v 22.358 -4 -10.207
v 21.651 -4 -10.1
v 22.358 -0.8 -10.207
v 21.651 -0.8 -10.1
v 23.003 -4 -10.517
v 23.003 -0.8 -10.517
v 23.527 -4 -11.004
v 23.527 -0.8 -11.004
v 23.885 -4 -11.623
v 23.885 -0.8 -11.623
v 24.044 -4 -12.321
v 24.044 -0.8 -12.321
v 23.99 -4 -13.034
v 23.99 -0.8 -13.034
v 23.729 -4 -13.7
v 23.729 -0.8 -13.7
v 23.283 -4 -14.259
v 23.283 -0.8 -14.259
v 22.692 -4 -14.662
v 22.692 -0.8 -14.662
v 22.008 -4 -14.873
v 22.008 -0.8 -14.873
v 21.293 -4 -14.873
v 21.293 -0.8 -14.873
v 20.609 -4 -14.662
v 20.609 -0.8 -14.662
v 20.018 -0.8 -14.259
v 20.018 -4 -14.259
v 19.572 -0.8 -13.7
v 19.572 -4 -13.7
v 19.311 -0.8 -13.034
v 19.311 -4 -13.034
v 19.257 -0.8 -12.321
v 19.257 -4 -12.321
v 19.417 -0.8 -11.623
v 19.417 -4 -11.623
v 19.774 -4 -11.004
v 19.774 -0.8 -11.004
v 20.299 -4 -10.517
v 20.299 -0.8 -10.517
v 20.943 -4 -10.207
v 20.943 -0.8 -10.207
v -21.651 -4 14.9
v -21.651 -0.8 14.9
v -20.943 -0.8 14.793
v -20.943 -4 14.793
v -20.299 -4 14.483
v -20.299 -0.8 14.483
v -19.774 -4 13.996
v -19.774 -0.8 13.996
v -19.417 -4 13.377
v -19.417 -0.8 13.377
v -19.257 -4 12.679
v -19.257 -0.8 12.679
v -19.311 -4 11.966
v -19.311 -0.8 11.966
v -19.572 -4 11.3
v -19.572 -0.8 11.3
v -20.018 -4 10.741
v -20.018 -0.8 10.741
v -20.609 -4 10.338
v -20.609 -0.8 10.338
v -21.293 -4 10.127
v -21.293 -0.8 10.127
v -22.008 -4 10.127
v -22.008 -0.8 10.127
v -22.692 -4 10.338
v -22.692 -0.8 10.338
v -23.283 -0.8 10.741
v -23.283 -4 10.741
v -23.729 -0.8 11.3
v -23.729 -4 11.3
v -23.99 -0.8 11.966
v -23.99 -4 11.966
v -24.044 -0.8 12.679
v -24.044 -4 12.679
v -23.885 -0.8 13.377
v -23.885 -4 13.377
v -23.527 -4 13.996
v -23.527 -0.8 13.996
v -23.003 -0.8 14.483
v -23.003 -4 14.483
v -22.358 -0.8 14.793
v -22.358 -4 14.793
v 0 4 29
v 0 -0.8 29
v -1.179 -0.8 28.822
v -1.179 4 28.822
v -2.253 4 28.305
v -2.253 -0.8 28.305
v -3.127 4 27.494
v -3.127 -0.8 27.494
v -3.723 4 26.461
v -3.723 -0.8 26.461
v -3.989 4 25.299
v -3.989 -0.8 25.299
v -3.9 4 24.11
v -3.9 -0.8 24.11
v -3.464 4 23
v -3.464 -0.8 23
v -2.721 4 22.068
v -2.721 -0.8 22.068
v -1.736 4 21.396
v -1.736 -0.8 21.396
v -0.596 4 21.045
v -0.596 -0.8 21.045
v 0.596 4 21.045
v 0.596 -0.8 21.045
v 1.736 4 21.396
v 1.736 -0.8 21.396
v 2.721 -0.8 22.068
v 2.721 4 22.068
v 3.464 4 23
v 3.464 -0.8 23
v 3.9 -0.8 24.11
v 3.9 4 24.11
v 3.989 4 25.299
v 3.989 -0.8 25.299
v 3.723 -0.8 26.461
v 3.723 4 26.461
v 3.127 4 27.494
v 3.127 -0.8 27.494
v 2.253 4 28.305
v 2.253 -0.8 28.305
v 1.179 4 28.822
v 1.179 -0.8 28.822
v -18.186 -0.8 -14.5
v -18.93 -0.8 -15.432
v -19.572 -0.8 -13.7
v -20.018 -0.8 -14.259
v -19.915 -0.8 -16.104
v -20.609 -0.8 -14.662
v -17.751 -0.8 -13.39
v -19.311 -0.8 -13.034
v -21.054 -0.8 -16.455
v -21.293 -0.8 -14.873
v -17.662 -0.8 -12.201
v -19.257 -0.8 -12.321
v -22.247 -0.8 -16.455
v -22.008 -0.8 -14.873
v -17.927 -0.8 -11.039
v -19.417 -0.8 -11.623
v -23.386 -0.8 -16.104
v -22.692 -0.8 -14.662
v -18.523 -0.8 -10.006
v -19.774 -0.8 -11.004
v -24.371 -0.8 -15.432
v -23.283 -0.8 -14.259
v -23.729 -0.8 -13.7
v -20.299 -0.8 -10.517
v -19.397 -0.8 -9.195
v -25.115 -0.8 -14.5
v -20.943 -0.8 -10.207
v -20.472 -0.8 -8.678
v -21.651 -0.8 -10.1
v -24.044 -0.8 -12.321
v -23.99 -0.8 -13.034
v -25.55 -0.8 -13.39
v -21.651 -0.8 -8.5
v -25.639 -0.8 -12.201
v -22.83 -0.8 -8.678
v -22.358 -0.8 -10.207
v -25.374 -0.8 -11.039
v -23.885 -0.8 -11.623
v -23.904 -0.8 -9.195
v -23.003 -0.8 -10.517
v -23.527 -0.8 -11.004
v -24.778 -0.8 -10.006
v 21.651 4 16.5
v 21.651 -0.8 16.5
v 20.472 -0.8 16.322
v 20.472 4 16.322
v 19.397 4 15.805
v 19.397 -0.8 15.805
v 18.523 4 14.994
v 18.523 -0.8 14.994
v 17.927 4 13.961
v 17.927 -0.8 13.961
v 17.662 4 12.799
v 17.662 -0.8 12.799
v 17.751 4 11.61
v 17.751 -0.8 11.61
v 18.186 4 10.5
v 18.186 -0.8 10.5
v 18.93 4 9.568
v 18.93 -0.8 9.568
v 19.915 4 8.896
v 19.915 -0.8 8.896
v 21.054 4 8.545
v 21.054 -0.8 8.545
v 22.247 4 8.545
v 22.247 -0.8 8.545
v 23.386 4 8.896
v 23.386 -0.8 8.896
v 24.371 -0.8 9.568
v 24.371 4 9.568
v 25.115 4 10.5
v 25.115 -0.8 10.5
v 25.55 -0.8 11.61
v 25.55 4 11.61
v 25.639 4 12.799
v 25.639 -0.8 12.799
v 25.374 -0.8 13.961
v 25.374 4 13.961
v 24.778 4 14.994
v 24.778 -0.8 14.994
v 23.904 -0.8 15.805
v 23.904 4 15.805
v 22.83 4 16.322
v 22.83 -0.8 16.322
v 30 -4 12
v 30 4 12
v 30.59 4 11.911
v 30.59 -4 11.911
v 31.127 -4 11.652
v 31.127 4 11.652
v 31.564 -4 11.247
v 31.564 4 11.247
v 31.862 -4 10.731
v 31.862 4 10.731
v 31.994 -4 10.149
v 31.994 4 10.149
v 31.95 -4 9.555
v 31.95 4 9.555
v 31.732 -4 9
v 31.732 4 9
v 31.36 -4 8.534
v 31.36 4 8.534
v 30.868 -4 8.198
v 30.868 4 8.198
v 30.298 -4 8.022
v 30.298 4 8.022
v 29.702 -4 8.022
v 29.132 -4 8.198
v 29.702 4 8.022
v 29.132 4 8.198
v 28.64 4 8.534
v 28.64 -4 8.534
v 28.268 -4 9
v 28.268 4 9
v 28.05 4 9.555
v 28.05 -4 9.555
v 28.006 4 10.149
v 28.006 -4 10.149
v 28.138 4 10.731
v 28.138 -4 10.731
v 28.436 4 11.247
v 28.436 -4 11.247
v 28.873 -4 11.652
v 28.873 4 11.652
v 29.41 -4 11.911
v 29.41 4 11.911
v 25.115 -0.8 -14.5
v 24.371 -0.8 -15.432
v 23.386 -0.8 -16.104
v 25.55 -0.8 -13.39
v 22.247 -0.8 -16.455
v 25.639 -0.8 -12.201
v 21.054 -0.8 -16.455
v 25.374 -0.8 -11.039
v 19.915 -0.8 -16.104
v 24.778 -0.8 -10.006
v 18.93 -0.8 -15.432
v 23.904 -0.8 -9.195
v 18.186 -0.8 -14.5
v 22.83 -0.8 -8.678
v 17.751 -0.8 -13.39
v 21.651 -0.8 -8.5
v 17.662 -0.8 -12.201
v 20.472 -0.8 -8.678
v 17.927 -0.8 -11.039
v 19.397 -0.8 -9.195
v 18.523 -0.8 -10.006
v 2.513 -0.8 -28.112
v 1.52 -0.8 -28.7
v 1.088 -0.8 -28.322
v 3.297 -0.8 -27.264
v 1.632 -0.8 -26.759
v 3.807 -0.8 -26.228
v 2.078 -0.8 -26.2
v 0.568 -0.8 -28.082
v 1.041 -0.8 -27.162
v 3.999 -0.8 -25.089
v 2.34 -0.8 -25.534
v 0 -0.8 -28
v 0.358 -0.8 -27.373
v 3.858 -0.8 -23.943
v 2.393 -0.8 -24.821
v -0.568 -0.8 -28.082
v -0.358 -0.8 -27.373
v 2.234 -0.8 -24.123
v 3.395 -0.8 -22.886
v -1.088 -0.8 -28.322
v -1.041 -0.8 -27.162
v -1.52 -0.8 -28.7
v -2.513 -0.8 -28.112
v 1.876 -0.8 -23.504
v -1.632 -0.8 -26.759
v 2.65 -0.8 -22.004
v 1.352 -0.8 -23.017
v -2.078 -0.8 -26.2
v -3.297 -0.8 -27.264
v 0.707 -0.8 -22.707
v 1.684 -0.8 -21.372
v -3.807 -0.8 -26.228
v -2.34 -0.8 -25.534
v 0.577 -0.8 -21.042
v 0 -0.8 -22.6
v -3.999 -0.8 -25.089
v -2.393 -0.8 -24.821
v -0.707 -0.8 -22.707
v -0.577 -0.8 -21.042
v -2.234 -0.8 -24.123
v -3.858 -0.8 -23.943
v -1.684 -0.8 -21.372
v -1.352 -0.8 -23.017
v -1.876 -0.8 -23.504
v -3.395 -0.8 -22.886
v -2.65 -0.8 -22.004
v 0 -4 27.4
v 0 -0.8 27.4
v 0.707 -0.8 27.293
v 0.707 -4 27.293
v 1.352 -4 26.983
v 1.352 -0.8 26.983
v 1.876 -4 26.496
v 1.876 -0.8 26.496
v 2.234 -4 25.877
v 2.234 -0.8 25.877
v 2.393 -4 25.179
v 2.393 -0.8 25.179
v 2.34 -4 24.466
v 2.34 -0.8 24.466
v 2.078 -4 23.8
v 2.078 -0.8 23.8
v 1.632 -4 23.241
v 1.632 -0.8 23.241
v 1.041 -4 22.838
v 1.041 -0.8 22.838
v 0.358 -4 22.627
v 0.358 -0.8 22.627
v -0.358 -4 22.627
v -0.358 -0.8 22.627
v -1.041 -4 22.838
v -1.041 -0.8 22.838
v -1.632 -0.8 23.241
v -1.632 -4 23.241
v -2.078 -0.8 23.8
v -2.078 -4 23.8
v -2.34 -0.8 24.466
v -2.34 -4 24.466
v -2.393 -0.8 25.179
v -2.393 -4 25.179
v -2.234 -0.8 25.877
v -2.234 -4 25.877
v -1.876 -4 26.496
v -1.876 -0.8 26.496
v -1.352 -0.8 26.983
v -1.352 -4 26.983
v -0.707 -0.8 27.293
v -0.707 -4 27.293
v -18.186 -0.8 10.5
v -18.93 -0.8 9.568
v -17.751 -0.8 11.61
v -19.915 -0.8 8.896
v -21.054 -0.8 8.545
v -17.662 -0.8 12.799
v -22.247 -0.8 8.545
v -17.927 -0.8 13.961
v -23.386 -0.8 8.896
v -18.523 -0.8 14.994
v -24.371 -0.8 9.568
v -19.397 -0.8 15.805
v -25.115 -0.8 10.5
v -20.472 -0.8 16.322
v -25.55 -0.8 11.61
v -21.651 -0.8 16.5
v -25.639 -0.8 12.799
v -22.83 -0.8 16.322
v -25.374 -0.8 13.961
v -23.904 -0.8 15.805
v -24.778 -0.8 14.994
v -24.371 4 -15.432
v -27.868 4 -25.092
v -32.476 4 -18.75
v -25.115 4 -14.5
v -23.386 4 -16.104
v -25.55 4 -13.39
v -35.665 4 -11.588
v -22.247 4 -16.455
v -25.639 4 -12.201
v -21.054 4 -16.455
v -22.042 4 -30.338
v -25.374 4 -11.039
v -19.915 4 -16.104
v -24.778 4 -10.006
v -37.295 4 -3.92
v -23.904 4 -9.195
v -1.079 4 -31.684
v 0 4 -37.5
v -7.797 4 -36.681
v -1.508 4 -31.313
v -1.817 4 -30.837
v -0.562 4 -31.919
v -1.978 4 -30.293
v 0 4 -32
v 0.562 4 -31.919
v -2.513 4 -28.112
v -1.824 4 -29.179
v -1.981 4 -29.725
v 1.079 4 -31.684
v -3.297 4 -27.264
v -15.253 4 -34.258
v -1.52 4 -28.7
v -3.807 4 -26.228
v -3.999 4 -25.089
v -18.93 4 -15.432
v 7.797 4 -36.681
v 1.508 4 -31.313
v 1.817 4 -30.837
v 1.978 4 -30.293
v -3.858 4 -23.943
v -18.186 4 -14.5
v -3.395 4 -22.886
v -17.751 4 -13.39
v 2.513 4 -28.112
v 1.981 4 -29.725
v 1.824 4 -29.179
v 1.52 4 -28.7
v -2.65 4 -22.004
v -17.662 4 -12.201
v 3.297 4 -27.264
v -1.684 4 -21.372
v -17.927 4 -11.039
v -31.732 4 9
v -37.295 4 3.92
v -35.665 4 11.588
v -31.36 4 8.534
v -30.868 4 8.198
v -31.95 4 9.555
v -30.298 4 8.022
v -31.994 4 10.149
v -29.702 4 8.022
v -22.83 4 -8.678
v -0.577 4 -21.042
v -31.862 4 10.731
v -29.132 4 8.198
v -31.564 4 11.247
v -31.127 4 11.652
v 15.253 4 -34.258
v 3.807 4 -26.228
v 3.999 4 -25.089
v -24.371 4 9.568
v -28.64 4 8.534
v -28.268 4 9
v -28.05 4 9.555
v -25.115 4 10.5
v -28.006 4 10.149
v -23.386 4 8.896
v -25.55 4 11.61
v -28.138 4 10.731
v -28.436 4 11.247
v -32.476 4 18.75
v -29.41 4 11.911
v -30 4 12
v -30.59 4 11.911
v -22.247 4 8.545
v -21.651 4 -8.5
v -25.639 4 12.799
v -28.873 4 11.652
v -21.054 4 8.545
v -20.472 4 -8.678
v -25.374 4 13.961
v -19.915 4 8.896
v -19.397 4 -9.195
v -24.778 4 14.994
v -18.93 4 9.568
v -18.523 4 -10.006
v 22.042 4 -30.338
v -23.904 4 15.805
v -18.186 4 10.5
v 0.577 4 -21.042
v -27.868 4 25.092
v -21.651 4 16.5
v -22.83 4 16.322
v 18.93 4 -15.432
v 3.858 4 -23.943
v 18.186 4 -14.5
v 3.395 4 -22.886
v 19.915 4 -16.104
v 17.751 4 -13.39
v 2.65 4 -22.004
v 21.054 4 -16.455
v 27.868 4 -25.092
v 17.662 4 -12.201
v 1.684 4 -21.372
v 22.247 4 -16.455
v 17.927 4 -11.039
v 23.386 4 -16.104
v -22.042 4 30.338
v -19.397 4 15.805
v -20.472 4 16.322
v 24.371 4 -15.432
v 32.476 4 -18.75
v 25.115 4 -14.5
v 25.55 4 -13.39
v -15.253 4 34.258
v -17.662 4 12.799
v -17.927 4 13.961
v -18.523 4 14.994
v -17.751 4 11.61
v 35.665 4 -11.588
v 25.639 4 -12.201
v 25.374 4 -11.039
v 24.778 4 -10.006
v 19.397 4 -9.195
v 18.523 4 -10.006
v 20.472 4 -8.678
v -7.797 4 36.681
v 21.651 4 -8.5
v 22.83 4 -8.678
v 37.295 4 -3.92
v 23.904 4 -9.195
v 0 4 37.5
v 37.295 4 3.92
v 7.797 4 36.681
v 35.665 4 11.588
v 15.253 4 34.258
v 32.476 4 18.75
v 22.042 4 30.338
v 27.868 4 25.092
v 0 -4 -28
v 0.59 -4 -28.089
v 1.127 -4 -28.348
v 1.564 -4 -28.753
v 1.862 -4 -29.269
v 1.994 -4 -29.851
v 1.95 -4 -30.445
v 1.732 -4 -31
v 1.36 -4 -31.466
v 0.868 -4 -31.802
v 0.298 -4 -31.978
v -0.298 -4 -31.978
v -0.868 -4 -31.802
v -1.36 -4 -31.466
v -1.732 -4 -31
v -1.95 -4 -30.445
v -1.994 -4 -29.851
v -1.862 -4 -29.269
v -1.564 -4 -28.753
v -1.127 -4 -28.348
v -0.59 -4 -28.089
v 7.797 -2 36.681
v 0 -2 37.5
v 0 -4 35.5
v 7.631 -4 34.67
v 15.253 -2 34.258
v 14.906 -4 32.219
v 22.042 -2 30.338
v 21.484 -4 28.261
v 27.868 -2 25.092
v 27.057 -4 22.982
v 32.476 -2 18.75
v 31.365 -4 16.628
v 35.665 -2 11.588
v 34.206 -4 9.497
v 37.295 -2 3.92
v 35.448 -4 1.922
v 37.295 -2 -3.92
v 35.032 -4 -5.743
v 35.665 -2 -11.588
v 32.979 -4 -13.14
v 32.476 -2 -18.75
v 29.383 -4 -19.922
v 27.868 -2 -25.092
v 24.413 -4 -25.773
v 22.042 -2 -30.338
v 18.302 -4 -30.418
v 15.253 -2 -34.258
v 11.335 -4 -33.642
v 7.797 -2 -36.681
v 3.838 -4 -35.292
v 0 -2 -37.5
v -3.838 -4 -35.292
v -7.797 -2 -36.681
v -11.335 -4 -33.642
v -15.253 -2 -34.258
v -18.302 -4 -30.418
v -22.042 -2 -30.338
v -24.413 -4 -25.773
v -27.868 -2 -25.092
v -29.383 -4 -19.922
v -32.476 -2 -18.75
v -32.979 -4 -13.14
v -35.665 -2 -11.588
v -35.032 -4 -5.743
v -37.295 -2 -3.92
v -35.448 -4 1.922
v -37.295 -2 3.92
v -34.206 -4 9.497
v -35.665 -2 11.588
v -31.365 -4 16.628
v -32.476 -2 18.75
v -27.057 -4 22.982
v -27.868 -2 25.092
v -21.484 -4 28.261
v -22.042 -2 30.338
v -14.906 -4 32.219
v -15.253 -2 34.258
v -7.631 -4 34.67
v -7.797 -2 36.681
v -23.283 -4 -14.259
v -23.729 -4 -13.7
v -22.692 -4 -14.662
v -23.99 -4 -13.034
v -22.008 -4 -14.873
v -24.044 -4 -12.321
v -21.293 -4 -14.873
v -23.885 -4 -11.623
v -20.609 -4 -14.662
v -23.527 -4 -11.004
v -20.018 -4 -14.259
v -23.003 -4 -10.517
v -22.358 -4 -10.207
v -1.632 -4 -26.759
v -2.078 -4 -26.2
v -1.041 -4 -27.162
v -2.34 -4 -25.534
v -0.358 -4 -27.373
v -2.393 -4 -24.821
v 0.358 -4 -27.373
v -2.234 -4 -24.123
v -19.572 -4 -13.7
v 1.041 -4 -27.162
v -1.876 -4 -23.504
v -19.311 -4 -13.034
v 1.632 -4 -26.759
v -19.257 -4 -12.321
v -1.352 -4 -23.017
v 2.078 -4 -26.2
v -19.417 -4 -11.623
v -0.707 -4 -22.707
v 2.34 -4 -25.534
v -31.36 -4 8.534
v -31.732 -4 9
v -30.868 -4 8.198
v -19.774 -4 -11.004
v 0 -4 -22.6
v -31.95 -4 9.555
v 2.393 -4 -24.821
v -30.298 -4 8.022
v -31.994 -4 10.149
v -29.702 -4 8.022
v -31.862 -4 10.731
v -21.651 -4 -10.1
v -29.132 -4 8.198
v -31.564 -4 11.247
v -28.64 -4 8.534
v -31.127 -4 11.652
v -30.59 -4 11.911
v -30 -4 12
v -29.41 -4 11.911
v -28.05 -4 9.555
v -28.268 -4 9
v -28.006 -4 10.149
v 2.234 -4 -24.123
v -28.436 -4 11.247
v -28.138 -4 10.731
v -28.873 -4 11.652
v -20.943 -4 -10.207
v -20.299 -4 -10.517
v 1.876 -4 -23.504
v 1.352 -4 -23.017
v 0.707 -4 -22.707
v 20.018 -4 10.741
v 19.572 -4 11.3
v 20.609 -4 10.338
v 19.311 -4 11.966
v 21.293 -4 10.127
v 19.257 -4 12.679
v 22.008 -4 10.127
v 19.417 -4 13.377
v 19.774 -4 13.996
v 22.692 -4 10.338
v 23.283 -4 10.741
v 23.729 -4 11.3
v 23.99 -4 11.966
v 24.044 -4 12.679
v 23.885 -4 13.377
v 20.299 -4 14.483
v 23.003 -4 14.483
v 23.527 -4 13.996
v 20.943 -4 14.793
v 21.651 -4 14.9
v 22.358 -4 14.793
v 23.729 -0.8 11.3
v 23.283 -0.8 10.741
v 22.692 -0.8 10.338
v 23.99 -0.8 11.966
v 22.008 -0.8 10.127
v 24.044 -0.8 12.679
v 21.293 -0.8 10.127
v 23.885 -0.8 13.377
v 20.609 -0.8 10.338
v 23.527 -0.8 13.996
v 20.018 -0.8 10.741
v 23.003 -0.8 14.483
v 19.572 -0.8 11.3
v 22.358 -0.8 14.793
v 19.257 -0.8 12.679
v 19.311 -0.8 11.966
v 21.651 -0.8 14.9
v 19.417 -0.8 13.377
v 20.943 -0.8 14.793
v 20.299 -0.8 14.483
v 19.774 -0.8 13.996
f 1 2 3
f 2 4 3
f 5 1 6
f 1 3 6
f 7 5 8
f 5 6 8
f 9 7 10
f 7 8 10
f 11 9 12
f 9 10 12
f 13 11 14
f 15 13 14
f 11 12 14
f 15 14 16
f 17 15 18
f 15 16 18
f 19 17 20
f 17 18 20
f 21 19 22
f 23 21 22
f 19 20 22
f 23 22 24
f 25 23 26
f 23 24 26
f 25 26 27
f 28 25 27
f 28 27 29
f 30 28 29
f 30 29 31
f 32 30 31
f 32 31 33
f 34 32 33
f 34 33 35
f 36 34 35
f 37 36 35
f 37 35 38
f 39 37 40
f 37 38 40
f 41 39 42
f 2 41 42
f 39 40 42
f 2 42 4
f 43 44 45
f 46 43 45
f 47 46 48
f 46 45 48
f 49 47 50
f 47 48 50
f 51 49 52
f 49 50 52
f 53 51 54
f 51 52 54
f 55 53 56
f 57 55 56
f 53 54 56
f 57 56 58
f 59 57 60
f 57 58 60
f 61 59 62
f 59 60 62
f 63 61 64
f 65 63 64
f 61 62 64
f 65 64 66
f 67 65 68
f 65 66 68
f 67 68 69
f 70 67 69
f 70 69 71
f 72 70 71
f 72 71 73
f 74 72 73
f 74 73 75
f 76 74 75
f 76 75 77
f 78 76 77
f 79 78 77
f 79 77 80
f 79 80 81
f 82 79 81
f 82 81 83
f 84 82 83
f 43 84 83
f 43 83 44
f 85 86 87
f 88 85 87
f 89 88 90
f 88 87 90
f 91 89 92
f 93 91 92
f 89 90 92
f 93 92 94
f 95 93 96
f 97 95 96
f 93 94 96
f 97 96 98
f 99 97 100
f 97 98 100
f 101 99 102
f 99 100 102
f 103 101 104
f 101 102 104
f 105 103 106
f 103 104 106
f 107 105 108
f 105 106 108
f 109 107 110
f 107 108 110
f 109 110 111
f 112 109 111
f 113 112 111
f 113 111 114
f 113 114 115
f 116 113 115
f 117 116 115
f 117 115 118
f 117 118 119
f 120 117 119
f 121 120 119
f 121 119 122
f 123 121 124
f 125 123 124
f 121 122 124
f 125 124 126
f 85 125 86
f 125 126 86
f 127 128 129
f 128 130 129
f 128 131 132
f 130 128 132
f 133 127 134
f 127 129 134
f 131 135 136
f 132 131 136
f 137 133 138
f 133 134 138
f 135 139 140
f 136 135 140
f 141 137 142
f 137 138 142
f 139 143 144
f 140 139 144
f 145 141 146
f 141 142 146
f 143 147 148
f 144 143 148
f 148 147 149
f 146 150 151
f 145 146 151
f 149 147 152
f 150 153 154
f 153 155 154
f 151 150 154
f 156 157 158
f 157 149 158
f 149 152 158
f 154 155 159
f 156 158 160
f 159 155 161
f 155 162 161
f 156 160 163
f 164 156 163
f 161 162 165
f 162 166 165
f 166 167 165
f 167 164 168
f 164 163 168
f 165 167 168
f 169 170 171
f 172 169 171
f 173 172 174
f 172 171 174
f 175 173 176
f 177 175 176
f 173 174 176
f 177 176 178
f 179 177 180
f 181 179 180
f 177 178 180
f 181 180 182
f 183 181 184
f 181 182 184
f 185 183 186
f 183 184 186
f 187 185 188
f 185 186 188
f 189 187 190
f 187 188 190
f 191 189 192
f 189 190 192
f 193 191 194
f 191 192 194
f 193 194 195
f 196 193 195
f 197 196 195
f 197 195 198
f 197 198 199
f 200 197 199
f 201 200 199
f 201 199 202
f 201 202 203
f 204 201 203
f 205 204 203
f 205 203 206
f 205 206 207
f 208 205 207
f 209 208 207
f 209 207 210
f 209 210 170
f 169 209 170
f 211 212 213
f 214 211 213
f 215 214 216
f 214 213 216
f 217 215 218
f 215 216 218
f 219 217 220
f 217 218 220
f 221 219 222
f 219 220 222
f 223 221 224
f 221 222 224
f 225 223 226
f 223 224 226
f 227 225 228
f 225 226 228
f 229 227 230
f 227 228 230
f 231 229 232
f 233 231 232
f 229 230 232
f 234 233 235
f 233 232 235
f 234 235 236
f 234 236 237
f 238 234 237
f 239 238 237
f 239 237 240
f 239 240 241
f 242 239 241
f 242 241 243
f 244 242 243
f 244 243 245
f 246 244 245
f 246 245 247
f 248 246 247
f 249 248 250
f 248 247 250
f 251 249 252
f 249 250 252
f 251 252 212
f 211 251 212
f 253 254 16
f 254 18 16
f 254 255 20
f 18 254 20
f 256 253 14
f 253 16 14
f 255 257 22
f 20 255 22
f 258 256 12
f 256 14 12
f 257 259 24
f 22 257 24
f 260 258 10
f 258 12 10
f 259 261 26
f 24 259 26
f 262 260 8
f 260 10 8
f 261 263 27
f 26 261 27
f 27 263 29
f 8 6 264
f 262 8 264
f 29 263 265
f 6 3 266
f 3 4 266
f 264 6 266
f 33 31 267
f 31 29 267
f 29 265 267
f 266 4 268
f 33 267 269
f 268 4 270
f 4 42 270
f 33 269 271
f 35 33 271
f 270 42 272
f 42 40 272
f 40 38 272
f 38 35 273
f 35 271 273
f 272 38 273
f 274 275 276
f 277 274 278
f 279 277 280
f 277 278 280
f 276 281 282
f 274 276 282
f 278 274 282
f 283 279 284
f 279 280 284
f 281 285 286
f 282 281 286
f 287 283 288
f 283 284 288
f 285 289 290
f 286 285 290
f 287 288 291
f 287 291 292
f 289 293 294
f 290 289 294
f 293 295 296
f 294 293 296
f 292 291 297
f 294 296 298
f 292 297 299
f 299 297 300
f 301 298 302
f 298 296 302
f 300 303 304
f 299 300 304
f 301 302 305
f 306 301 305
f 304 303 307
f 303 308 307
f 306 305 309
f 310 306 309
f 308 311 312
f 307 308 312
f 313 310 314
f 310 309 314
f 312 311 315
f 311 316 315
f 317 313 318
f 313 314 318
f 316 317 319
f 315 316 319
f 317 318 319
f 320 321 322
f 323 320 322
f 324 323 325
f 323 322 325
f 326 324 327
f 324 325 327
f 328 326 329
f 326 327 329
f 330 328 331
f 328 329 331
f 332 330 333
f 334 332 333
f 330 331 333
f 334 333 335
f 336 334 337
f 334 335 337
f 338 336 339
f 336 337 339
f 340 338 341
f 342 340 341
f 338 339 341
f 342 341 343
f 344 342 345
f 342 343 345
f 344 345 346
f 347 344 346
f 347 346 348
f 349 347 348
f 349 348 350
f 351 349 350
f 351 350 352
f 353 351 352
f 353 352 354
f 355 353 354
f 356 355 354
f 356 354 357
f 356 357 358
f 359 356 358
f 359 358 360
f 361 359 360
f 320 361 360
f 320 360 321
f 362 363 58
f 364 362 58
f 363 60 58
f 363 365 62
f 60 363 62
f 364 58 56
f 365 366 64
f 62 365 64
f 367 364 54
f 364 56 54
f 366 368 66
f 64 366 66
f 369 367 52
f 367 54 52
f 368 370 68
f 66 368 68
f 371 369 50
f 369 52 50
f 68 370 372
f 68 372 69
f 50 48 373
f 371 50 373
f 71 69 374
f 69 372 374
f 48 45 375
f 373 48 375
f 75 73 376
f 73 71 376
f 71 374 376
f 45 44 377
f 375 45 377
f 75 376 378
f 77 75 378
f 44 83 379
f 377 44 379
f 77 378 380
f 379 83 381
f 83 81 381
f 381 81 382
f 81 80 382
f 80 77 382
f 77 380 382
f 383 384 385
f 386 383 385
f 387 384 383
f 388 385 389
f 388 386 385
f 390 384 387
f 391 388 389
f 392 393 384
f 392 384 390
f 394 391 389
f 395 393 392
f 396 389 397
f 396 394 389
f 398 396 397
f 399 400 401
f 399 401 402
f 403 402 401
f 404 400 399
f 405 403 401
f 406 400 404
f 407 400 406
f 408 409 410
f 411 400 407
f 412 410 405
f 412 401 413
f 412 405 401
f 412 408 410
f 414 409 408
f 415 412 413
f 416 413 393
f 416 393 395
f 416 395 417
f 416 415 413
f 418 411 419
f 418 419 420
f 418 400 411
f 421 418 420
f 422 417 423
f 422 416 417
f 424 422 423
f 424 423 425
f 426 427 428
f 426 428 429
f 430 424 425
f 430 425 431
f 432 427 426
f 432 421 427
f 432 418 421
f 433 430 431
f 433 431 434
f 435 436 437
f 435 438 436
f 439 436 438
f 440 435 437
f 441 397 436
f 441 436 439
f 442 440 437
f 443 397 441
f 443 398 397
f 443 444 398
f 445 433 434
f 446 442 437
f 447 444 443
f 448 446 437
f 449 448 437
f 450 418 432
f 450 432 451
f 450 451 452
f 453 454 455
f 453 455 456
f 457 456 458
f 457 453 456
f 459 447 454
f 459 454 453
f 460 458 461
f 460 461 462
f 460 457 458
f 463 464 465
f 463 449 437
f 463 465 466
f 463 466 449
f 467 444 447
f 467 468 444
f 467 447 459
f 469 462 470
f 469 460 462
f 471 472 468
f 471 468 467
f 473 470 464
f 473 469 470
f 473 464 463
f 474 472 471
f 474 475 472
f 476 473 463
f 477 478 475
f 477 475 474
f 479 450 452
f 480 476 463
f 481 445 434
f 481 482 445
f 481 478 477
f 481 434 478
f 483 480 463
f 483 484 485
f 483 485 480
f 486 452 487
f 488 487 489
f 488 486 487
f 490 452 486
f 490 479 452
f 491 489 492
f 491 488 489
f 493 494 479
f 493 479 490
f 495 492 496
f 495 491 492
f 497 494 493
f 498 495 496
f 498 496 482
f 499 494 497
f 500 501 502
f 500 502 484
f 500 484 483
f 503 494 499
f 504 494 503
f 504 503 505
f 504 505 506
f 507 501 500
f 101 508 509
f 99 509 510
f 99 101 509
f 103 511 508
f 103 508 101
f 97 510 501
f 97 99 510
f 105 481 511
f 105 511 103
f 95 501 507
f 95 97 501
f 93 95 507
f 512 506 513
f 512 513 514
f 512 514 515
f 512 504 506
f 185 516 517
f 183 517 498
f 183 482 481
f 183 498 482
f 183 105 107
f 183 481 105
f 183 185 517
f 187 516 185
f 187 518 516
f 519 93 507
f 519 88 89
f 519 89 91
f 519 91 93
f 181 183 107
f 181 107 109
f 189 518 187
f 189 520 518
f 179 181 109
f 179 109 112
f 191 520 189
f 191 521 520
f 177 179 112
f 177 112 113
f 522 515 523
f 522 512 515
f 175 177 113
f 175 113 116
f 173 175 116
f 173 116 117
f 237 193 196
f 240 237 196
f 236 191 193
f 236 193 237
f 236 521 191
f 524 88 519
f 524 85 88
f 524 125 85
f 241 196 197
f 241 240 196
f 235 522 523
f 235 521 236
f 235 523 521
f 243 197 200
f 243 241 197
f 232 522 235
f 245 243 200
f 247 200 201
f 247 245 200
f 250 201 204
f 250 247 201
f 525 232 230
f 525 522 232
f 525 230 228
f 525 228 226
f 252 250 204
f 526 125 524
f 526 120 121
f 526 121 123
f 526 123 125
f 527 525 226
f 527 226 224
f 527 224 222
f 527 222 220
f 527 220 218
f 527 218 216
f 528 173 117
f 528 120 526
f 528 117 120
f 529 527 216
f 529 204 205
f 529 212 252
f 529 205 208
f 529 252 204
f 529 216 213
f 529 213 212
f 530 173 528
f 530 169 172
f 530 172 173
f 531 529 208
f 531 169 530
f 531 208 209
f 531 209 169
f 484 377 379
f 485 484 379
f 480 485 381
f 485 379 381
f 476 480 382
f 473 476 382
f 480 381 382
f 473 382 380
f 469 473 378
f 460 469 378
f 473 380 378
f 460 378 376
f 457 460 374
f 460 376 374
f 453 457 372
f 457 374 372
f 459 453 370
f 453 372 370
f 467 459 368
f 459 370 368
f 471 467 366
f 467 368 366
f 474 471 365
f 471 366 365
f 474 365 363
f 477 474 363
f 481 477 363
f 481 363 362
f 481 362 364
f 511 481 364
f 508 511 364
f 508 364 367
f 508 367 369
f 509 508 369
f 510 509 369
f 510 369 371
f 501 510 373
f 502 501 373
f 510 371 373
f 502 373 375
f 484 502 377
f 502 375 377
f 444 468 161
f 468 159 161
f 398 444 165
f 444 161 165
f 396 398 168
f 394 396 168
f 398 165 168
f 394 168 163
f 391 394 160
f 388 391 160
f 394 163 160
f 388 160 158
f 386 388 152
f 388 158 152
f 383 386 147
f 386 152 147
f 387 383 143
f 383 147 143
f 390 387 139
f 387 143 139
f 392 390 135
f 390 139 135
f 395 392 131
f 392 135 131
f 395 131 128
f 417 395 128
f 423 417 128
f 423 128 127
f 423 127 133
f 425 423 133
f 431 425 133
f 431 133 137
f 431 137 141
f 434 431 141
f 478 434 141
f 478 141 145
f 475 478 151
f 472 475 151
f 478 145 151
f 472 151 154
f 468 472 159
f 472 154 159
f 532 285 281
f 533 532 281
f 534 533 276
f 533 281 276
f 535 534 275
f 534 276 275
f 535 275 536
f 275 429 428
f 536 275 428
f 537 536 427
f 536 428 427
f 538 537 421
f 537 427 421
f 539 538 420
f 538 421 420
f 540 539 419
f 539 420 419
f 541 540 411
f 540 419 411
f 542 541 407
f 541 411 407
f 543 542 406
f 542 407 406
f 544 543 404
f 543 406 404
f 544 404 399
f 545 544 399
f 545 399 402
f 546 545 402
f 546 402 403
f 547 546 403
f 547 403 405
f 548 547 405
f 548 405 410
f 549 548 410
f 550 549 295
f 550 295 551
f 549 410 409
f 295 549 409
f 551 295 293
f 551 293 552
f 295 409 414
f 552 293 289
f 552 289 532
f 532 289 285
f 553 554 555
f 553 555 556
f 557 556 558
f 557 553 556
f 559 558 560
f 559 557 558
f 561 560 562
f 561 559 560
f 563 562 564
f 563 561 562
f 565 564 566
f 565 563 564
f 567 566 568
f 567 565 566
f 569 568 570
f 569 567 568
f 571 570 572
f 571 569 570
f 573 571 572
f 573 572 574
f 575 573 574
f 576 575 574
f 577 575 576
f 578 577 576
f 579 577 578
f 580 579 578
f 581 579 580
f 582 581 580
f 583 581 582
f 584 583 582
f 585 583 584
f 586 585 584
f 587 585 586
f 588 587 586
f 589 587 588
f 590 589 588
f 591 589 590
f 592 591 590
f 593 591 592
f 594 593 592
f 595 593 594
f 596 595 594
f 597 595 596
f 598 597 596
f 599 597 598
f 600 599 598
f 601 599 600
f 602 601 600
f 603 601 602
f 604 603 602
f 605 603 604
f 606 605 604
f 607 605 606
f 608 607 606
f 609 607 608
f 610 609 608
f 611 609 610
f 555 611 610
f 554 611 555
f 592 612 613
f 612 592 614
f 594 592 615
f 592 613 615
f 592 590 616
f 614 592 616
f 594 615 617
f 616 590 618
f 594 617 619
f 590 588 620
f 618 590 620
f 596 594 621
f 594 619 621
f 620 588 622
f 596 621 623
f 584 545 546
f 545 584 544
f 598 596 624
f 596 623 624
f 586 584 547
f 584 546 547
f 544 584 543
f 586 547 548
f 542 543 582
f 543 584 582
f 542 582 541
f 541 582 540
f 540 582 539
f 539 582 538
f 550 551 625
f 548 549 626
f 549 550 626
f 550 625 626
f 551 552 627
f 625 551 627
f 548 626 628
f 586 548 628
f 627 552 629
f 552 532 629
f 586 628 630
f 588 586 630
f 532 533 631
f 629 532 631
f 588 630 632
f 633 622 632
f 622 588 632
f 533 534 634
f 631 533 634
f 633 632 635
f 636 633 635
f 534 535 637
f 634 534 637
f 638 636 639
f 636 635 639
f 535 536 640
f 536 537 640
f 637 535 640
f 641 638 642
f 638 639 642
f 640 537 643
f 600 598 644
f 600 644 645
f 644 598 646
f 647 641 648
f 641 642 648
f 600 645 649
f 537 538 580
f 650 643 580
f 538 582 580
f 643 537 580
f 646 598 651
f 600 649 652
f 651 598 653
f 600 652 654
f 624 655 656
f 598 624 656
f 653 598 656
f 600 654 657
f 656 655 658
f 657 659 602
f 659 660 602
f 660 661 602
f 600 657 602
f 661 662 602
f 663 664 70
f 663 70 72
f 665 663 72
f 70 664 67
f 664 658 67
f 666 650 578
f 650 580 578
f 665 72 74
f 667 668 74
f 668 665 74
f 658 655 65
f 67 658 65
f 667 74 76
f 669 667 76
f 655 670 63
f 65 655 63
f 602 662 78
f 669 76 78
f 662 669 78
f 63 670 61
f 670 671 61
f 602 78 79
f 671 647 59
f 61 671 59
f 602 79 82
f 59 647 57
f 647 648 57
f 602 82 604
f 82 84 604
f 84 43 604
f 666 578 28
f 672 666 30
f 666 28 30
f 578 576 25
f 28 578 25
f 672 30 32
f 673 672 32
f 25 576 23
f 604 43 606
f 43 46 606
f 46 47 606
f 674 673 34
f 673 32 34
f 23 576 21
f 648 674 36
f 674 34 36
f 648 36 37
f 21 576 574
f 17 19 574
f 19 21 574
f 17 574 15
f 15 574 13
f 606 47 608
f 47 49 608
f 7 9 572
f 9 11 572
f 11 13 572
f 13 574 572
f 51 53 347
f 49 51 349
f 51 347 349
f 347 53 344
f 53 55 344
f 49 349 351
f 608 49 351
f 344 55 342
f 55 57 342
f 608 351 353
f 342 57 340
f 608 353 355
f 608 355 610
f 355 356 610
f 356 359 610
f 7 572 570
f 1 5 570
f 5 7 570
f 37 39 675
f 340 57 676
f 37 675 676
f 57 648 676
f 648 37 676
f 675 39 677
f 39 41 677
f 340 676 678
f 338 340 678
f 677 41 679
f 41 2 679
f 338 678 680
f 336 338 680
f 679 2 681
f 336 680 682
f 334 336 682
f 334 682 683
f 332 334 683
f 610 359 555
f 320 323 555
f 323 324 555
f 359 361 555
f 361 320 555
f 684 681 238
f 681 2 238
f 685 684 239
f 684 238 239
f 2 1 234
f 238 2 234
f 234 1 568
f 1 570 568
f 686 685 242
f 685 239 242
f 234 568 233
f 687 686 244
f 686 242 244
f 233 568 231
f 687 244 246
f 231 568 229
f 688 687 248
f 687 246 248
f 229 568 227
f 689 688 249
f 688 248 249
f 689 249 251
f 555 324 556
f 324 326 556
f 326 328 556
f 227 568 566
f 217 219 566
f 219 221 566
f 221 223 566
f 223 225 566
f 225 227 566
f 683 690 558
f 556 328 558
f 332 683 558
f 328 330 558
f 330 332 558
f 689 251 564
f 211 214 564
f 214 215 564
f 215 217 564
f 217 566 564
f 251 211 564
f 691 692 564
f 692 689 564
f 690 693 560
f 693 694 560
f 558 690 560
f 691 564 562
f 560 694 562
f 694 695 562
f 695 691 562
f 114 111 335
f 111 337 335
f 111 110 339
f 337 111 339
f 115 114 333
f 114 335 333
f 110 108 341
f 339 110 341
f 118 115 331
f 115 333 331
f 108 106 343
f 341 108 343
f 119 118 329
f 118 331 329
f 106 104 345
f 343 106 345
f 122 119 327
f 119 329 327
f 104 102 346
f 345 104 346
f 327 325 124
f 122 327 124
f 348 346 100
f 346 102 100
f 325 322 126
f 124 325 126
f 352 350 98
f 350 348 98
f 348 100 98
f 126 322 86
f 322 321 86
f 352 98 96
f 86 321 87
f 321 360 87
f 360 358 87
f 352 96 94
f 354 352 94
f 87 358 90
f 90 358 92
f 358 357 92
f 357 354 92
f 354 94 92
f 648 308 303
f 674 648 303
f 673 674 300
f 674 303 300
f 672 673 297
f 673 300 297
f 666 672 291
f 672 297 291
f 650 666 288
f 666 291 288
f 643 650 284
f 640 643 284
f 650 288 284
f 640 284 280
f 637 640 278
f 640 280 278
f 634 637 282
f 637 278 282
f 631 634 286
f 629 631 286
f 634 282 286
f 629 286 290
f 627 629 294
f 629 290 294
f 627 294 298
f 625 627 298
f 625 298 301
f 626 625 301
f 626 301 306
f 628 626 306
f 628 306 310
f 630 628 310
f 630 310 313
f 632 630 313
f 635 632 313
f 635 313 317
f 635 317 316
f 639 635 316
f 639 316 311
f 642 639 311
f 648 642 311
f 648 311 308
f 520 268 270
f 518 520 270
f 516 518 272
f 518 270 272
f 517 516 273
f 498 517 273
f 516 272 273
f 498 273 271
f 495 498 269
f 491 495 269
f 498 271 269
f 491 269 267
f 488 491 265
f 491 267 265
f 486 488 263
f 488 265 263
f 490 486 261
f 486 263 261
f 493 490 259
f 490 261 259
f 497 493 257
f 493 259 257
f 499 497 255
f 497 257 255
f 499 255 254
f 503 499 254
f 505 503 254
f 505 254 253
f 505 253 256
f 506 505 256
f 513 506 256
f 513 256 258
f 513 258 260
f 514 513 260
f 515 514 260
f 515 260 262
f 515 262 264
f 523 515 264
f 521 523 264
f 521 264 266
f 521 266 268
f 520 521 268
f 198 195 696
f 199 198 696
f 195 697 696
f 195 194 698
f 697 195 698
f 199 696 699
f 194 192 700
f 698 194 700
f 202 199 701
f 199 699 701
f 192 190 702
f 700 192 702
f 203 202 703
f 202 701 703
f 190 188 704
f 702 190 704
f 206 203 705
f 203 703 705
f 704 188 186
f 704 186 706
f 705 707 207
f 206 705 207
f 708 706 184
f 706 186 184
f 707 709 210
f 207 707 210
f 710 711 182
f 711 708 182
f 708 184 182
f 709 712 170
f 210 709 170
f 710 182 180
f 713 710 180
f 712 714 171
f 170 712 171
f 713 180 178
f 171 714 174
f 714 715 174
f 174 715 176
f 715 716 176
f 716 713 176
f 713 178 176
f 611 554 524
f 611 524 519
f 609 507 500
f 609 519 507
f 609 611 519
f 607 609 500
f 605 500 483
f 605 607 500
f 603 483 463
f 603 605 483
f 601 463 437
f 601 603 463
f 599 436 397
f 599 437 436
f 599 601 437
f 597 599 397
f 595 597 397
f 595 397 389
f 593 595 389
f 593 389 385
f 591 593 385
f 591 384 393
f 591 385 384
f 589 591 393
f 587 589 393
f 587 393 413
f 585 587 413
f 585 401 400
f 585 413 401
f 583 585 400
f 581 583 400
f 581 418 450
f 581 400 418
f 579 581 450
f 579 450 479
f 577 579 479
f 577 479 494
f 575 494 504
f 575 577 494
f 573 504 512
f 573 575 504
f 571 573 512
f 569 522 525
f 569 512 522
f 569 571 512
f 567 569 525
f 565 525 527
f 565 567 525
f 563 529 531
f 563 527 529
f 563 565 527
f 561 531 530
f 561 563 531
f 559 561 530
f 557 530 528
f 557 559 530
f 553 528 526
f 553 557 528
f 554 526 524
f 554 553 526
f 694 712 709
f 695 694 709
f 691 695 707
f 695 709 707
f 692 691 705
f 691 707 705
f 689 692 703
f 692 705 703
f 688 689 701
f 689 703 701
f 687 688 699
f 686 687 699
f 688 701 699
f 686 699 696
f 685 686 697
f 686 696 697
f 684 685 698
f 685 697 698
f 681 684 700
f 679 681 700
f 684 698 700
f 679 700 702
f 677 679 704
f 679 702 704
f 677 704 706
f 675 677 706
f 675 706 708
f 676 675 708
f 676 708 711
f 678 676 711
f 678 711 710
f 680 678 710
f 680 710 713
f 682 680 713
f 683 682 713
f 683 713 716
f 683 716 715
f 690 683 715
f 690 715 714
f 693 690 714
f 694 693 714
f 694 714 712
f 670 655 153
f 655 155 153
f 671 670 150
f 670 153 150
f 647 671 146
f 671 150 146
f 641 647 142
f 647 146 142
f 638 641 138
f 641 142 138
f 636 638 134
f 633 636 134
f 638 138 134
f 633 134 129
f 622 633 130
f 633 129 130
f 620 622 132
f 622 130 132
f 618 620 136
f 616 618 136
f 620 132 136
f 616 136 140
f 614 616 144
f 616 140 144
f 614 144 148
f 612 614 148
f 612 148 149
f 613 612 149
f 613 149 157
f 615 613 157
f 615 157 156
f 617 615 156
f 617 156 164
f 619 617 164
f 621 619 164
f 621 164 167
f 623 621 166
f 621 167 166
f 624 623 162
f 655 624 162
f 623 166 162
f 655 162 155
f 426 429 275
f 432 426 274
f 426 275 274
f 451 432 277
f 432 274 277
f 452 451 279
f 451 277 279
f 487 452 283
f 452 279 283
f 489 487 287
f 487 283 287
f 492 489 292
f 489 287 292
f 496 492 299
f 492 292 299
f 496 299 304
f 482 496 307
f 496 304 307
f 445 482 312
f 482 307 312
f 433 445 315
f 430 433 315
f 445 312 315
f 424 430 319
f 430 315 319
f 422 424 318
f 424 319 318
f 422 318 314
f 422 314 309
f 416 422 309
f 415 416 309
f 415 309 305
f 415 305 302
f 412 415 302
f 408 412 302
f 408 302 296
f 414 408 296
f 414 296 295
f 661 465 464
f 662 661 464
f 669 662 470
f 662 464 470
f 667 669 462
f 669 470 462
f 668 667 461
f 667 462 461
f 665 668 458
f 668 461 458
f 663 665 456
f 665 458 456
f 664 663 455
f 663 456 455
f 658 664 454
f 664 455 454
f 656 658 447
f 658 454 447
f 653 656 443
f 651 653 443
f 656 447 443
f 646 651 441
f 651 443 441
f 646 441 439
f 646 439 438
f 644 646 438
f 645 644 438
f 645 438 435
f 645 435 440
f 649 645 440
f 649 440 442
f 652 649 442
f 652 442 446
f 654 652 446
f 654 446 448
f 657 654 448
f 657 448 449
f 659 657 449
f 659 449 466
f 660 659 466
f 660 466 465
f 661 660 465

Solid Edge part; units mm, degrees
sketch "Sketch1" plane through (0, 0, 0) normal (1, 0, 0) x (0, 1, 0)
  line L0 (4, 0) -> (4, 37.5)
  line L1 (4, 37.5) -> (-2, 37.5)
  line L2 (-2, 37.5) -> (-4, 35.5)
  line L3 (-4, 35.5) -> (-4, 0)
  dimension "D1" = 8
  dimension "D2" = 6
revolve "RevolvedProtrusion1" add sketch "Sketch1" angle 360 about axis through (0, -4, 0) along (0, 1, 0)
hole "Hole_1" at (30, 4, 10) direction (0, -1, 0) diameter 4 end up to next
hole "Hole1" at (-30, 4, 10) direction (0, -1, 0) diameter 4 end up to next
hole "Hole2" at (0, 4, -30) direction (0, -1, 0) diameter 4 end up to next
hole "Hole_4" at (0, 4, 25) direction (0, -1, 0) diameter 4.8 end up to next counterbore diameter 8 counterbore depth 4.8
hole "Hole3" at (0, 4, -25) direction (0, -1, 0) diameter 4.8 end up to next counterbore diameter 8 counterbore depth 4.8
hole "Hole4" at (-21.6506, 4, 12.5) direction (0, -1, 0) diameter 4.8 end up to next counterbore diameter 8 counterbore depth 4.8
hole "Hole5" at (-21.6506, 4, -12.5) direction (0, -1, 0) diameter 4.8 end up to next counterbore diameter 8 counterbore depth 4.8
hole "Hole6" at (21.6506, 4, 12.5) direction (0, -1, 0) diameter 4.8 end up to next counterbore diameter 8 counterbore depth 4.8
hole "Hole7" at (21.6506, 4, -12.5) direction (0, -1, 0) diameter 4.8 end up to next counterbore diameter 8 counterbore depth 4.8
properties material "Polyethylene, low density"
